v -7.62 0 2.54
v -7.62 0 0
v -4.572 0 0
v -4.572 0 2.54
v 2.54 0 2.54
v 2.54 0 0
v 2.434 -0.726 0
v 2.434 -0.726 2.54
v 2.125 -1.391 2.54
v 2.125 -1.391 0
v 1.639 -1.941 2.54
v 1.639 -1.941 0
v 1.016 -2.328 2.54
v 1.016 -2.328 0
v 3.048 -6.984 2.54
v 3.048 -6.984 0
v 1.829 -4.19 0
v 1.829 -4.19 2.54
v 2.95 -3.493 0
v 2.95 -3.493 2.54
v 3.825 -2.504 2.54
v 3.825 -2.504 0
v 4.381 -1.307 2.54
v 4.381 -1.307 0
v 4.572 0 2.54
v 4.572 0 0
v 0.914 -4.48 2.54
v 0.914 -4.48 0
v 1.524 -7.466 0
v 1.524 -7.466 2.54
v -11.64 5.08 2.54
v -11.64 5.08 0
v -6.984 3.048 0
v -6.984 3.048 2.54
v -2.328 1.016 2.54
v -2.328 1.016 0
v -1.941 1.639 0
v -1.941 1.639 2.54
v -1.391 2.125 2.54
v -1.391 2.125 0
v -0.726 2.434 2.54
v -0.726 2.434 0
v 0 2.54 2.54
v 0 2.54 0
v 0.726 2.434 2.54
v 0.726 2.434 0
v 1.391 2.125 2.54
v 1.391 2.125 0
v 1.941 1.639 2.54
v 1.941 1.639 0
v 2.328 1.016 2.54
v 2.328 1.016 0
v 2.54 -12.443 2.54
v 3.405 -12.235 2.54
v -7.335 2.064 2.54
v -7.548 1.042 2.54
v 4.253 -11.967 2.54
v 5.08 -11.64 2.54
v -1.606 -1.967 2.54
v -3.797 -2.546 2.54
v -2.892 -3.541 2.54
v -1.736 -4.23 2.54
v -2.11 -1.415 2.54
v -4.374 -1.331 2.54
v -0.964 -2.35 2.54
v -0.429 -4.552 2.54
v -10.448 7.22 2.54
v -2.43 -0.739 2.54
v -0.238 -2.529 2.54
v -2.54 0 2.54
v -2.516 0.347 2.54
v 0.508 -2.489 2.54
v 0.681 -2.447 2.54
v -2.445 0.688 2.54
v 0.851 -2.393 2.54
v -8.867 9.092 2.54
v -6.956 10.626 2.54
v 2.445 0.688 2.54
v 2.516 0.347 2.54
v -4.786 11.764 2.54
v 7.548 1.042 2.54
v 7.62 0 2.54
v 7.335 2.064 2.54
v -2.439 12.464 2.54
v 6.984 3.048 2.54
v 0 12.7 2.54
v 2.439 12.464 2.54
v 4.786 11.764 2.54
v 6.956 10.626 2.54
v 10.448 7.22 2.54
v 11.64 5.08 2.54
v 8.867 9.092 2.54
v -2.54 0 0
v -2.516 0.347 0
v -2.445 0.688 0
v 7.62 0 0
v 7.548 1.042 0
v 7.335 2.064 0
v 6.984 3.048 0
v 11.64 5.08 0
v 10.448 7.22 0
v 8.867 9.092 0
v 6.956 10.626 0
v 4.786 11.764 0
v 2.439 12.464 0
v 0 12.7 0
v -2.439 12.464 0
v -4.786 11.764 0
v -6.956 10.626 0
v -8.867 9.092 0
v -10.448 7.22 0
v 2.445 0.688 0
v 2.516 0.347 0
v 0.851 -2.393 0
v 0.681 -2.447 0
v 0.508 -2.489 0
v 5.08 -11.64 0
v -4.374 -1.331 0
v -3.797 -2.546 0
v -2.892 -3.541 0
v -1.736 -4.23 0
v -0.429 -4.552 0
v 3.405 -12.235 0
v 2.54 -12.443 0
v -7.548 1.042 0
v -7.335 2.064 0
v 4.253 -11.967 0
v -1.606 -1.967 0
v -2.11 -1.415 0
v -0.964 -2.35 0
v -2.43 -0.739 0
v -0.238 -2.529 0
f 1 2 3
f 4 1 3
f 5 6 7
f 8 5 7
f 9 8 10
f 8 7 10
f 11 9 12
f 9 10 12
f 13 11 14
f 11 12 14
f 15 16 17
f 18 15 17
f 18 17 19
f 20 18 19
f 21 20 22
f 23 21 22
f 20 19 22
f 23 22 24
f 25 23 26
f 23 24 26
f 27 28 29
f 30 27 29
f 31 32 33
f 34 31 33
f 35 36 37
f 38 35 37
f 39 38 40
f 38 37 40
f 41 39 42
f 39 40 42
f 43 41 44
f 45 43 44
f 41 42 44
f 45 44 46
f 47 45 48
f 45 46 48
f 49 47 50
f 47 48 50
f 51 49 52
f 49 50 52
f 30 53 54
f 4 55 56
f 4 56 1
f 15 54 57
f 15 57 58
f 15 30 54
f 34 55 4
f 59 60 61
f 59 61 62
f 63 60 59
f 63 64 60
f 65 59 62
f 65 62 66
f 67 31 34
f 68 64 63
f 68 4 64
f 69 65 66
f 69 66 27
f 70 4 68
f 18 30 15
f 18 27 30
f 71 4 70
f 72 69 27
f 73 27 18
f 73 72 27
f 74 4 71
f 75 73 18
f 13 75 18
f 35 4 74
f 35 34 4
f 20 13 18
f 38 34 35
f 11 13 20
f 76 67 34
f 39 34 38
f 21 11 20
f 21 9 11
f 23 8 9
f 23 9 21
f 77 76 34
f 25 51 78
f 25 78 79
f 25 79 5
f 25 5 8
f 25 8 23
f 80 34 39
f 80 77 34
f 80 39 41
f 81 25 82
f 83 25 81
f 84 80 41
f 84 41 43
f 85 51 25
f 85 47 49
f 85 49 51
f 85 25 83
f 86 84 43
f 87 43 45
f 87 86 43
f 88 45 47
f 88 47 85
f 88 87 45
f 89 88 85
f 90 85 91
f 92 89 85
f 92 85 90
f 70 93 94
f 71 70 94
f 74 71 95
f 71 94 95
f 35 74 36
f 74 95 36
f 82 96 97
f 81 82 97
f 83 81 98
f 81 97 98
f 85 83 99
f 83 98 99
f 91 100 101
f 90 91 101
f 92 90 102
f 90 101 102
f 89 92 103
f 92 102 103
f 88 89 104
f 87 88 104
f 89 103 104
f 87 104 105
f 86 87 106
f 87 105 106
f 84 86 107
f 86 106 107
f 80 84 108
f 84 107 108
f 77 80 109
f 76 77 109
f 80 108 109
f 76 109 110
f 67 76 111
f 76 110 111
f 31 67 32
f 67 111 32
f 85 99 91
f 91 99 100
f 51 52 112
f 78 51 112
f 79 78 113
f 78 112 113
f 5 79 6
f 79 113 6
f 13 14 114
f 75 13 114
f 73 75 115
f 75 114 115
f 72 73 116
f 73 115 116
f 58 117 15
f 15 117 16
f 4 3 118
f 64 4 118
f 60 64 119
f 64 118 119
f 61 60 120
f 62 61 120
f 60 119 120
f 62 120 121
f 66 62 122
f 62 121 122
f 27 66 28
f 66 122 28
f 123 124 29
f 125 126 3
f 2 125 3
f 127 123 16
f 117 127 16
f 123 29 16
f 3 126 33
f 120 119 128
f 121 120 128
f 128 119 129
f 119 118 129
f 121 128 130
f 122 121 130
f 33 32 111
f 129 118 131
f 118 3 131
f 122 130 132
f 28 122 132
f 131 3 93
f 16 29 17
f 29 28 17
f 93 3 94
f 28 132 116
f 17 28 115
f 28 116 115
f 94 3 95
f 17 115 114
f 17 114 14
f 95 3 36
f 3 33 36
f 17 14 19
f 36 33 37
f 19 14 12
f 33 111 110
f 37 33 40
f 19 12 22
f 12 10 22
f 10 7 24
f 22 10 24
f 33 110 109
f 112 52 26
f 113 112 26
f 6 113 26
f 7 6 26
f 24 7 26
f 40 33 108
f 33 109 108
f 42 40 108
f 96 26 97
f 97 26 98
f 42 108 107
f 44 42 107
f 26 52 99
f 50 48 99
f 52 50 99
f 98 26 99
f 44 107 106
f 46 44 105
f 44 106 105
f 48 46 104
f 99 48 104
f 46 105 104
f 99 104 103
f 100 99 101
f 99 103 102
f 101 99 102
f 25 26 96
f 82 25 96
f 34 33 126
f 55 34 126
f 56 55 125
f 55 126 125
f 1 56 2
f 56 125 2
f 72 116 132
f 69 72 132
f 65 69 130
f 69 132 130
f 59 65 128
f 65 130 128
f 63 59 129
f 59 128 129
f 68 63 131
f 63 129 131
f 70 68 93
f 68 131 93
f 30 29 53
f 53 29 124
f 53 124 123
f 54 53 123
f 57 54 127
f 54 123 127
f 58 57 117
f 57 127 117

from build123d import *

# Parameters (mm, degrees)
F1_DEPTH = 2.54


with BuildPart() as f1:
    # F0 (on Top) → F1 (new body)
    with BuildSketch(Plane.XY):
        with BuildLine():
            ThreePointArc((2.327948453, 1.016), (2.4864220348, 0.518946495), (2.54, 0))
            Line((2.54, 0), (4.572, 0))
            ThreePointArc((4.572, 0), (4.4755596627, 0.9341036909), (4.1903072155, 1.8288))
            Line((4.1903072155, 1.8288), (2.327948453, 1.016))
        make_face()
        with BuildLine():
            Line((4.572, 0), (2.54, 0))
            ThreePointArc((2.54, 0), (2.1251164674, -1.3912152961), (1.016, -2.327948453))
            Line((1.016, -2.327948453), (1.8288, -4.1903072155))
            ThreePointArc((1.8288, -4.1903072155), (3.8252096413, -2.5041875329), (4.572, 0))
        make_face()
        with BuildLine():
            ThreePointArc((-2.327948453, 1.016), (0, 2.54), (2.327948453, 1.016))
            Line((2.327948453, 1.016), (4.1903072155, 1.8288))
            ThreePointArc((4.1903072155, 1.8288), (0, 4.572), (-4.1903072155, 1.8288))
            Line((-4.1903072155, 1.8288), (-2.327948453, 1.016))
        make_face()
        with BuildLine():
            ThreePointArc((-2.54, 0), (-2.4864220348, 0.518946495), (-2.327948453, 1.016))
            Line((-2.327948453, 1.016), (-4.1903072155, 1.8288))
            ThreePointArc((-4.1903072155, 1.8288), (-4.4755596627, 0.9341036909), (-4.572, 0))
            Line((-4.572, 0), (-2.54, 0))
        make_face()
        with BuildLine():
            Line((0.9144, -4.4796268416), (0.508, -2.4886815787))
            ThreePointArc((0.508, -2.4886815787), (-1.6064370514, -1.9674755399), (-2.54, 0))
            Line((-2.54, 0), (-4.572, 0))
            ThreePointArc((-4.572, 0), (-2.8915866925, -3.5414559718), (0.9144, -4.4796268416))
        make_face()
        with BuildLine():
            ThreePointArc((1.016, -2.327948453), (0.7662263272, -2.4216724005), (0.508, -2.4886815787))
            Line((0.508, -2.4886815787), (0.9144, -4.4796268416))
            ThreePointArc((0.9144, -4.4796268416), (1.3792073889, -4.359010321), (1.8288, -4.1903072155))
            Line((1.8288, -4.1903072155), (1.016, -2.327948453))
        make_face()
        with BuildLine():
            ThreePointArc((4.1903072155, 1.8288), (4.4755596627, 0.9341036909), (4.572, 0))
            Line((4.572, 0), (7.62, 0))
            ThreePointArc((7.62, 0), (7.4592661045, 1.5568394849), (6.9838453591, 3.048))
            Line((6.9838453591, 3.048), (4.1903072155, 1.8288))
        make_face()
        with BuildLine():
            ThreePointArc((-4.1903072155, 1.8288), (0, 4.572), (4.1903072155, 1.8288))
            Line((4.1903072155, 1.8288), (6.9838453591, 3.048))
            ThreePointArc((6.9838453591, 3.048), (0, 7.62), (-6.9838453591, 3.048))
            Line((-6.9838453591, 3.048), (-4.1903072155, 1.8288))
        make_face()
        with BuildLine():
            ThreePointArc((-4.572, 0), (-4.4755596627, 0.9341036909), (-4.1903072155, 1.8288))
            Line((-4.1903072155, 1.8288), (-6.9838453591, 3.048))
            ThreePointArc((-6.9838453591, 3.048), (-7.4592661045, 1.5568394849), (-7.62, 0))
            Line((-7.62, 0), (-4.572, 0))
        make_face()
        with BuildLine():
            ThreePointArc((1.8288, -4.1903072155), (1.3792073889, -4.359010321), (0.9144, -4.4796268416))
            Line((0.9144, -4.4796268416), (1.524, -7.466044736))
            ThreePointArc((1.524, -7.466044736), (2.2986789815, -7.2650172016), (3.048, -6.9838453591))
            Line((3.048, -6.9838453591), (1.8288, -4.1903072155))
        make_face()
        with BuildLine():
            ThreePointArc((-6.9838453591, 3.048), (0, 7.62), (6.9838453591, 3.048))
            Line((6.9838453591, 3.048), (11.6397422652, 5.08))
            ThreePointArc((11.6397422652, 5.08), (0, 12.7), (-11.6397422652, 5.08))
            Line((-11.6397422652, 5.08), (-6.9838453591, 3.048))
        make_face()
        with BuildLine():
            ThreePointArc((3.048, -6.9838453591), (2.2986789815, -7.2650172016), (1.524, -7.466044736))
            Line((1.524, -7.466044736), (2.54, -12.4434078933))
            ThreePointArc((2.54, -12.4434078933), (3.8311316358, -12.1083620027), (5.08, -11.6397422652))
            Line((5.08, -11.6397422652), (3.048, -6.9838453591))
        make_face()
    extrude(amount=F1_DEPTH)


solid = f1.part
